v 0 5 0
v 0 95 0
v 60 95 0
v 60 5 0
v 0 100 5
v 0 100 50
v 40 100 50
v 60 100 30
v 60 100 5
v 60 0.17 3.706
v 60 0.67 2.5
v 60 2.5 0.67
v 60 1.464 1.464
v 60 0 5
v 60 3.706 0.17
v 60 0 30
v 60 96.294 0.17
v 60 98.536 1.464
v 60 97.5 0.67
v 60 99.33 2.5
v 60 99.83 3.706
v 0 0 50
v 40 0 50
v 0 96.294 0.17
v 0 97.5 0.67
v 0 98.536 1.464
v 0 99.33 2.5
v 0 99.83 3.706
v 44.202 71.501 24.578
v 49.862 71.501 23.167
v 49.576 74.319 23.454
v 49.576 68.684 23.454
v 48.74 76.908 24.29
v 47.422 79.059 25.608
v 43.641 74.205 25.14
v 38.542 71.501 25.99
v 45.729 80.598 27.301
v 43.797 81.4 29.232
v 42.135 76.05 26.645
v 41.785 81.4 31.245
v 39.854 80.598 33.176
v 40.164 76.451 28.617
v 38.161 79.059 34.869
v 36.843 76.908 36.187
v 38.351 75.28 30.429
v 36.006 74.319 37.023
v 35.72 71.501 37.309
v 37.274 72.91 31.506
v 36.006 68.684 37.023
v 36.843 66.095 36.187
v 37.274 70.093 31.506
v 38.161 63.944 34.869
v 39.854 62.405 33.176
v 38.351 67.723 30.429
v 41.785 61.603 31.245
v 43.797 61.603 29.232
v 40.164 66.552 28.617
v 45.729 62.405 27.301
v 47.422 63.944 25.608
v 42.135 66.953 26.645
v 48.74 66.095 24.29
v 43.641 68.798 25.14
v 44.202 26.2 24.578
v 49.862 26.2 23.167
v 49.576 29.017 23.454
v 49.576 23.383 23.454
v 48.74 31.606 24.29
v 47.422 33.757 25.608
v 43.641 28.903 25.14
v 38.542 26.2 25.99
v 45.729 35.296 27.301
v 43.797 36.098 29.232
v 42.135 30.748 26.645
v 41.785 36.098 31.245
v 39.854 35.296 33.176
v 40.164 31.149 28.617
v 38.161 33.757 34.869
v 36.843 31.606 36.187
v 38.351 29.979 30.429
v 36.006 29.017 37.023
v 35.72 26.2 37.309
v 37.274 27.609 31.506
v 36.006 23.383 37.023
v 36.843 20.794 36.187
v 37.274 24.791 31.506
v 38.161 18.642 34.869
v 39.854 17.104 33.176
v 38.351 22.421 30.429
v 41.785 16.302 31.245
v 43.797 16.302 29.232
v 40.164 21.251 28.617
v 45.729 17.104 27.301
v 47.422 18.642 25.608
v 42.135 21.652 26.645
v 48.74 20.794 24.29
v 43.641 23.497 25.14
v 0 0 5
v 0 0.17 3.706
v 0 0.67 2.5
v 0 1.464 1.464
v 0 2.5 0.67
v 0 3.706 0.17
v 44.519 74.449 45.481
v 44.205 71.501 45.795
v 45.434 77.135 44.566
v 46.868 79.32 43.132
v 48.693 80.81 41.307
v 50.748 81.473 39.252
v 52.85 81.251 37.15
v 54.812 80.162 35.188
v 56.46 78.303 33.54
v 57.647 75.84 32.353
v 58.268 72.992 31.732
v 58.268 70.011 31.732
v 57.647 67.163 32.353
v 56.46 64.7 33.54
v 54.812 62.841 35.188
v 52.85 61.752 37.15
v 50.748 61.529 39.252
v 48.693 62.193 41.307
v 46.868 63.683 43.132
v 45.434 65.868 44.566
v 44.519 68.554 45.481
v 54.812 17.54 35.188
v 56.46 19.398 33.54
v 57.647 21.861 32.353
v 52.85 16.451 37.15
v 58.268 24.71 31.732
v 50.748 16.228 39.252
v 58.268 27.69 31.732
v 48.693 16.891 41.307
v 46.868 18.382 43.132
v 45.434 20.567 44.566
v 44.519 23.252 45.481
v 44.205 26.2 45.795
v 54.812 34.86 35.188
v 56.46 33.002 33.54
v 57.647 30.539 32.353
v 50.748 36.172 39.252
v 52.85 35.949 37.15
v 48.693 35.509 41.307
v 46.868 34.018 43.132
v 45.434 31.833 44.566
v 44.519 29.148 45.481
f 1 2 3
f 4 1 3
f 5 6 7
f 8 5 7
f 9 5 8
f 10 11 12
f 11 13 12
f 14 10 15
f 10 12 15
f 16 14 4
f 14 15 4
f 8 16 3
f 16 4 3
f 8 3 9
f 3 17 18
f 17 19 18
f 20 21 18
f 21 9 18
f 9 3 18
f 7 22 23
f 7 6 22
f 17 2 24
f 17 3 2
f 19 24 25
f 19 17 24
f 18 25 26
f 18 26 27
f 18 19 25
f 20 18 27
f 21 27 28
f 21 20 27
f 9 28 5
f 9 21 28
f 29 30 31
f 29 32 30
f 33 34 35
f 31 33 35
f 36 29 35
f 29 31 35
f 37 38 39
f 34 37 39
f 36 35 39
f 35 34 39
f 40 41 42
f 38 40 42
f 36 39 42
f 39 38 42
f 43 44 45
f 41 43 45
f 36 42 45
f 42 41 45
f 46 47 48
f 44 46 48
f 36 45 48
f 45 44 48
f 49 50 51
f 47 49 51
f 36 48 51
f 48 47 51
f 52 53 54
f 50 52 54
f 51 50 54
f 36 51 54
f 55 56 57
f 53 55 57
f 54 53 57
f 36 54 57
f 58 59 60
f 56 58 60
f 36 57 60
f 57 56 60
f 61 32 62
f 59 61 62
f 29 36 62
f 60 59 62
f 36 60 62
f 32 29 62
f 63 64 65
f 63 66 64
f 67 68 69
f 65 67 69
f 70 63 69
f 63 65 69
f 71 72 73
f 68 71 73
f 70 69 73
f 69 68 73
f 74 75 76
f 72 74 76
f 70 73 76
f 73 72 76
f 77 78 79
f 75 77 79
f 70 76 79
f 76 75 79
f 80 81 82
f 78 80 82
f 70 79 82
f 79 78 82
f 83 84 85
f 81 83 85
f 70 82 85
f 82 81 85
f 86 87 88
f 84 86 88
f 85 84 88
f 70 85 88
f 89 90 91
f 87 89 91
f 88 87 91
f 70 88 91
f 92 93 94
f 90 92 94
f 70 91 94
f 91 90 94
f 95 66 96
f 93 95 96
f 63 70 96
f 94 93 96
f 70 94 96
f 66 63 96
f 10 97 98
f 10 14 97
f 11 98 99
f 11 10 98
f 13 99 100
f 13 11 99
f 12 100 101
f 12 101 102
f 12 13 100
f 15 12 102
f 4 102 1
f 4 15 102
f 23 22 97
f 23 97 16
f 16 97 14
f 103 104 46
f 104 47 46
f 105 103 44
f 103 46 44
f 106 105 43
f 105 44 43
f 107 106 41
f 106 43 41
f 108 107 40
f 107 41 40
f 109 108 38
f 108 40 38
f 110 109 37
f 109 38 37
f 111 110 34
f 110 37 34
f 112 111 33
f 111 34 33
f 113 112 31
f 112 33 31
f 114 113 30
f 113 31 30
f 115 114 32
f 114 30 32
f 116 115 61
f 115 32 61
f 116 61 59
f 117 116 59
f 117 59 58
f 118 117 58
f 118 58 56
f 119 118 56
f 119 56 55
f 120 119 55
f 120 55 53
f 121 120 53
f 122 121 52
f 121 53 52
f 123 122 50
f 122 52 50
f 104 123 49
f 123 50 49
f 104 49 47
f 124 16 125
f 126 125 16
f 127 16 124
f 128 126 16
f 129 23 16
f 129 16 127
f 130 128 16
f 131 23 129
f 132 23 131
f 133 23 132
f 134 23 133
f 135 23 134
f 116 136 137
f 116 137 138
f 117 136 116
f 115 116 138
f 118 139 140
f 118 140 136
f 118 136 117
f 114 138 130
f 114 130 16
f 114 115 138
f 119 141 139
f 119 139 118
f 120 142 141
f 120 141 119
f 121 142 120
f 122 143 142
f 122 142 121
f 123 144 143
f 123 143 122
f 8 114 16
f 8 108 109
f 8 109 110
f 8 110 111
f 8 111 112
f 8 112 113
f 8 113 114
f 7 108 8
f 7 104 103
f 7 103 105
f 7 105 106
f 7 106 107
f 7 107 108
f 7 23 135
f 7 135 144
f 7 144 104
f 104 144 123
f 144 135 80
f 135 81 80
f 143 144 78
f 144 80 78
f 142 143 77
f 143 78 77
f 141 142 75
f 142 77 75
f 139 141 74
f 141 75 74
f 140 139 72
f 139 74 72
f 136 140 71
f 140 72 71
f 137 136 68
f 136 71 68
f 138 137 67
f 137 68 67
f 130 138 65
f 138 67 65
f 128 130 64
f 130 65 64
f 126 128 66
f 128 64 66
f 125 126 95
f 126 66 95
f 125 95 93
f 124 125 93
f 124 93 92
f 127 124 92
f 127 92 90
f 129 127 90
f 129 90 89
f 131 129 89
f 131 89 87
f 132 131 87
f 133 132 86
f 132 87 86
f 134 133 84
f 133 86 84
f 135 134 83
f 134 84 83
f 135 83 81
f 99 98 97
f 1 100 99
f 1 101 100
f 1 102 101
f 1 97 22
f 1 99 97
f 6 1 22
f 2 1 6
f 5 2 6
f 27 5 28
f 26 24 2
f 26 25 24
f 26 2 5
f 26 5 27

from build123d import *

# Parameters (mm, degrees)
F0_W     = 60
F0_H     = 100
F1_DEPTH = 50
F2_SIZE  = 20
F4_D     = 20
F4_DEPTH = 12
F4_TIP   = 6.0086061903
F6_R     = 5
F7_R     = 5


with BuildPart() as f1:
    # F0 (on Top) → F1 (new body)
    with BuildSketch(Plane.XY):
        with Locations((30, 50)):
            Rectangle(F0_W, F0_H)
    extrude(amount=F1_DEPTH)

    # F2
    f2_edges = [f1.edges().sort_by_distance(p)[0] for p in [
        (60, 50, 50),
    ]]
    chamfer(f2_edges, length=F2_SIZE)

    # F4
    with Locations(Plane(origin=(45, 0, 45), x_dir=(0.7071067812, 0, -0.7071067812), z_dir=(0.7071067812, 0, 0.7071067812))):
        with Locations((8.8761840016, 26.199977845), (8.8761840016, 71.5014504518)):
            Hole(F4_D / 2, depth=F4_DEPTH)
            with Locations((0, 0, -(F4_DEPTH + F4_TIP / 2))):  # 118° drill point
                Cone(0, F4_D / 2, F4_TIP, mode=Mode.SUBTRACT)

    # F6
    f6_edges = [f1.edges().sort_by_distance(p)[0] for p in [
        (30, 0, 0),
    ]]
    fillet(f6_edges, radius=F6_R)

    # F7
    f7_edges = [f1.edges().sort_by_distance(p)[0] for p in [
        (30, 100, 0),
    ]]
    fillet(f7_edges, radius=F7_R)


solid = f1.part
